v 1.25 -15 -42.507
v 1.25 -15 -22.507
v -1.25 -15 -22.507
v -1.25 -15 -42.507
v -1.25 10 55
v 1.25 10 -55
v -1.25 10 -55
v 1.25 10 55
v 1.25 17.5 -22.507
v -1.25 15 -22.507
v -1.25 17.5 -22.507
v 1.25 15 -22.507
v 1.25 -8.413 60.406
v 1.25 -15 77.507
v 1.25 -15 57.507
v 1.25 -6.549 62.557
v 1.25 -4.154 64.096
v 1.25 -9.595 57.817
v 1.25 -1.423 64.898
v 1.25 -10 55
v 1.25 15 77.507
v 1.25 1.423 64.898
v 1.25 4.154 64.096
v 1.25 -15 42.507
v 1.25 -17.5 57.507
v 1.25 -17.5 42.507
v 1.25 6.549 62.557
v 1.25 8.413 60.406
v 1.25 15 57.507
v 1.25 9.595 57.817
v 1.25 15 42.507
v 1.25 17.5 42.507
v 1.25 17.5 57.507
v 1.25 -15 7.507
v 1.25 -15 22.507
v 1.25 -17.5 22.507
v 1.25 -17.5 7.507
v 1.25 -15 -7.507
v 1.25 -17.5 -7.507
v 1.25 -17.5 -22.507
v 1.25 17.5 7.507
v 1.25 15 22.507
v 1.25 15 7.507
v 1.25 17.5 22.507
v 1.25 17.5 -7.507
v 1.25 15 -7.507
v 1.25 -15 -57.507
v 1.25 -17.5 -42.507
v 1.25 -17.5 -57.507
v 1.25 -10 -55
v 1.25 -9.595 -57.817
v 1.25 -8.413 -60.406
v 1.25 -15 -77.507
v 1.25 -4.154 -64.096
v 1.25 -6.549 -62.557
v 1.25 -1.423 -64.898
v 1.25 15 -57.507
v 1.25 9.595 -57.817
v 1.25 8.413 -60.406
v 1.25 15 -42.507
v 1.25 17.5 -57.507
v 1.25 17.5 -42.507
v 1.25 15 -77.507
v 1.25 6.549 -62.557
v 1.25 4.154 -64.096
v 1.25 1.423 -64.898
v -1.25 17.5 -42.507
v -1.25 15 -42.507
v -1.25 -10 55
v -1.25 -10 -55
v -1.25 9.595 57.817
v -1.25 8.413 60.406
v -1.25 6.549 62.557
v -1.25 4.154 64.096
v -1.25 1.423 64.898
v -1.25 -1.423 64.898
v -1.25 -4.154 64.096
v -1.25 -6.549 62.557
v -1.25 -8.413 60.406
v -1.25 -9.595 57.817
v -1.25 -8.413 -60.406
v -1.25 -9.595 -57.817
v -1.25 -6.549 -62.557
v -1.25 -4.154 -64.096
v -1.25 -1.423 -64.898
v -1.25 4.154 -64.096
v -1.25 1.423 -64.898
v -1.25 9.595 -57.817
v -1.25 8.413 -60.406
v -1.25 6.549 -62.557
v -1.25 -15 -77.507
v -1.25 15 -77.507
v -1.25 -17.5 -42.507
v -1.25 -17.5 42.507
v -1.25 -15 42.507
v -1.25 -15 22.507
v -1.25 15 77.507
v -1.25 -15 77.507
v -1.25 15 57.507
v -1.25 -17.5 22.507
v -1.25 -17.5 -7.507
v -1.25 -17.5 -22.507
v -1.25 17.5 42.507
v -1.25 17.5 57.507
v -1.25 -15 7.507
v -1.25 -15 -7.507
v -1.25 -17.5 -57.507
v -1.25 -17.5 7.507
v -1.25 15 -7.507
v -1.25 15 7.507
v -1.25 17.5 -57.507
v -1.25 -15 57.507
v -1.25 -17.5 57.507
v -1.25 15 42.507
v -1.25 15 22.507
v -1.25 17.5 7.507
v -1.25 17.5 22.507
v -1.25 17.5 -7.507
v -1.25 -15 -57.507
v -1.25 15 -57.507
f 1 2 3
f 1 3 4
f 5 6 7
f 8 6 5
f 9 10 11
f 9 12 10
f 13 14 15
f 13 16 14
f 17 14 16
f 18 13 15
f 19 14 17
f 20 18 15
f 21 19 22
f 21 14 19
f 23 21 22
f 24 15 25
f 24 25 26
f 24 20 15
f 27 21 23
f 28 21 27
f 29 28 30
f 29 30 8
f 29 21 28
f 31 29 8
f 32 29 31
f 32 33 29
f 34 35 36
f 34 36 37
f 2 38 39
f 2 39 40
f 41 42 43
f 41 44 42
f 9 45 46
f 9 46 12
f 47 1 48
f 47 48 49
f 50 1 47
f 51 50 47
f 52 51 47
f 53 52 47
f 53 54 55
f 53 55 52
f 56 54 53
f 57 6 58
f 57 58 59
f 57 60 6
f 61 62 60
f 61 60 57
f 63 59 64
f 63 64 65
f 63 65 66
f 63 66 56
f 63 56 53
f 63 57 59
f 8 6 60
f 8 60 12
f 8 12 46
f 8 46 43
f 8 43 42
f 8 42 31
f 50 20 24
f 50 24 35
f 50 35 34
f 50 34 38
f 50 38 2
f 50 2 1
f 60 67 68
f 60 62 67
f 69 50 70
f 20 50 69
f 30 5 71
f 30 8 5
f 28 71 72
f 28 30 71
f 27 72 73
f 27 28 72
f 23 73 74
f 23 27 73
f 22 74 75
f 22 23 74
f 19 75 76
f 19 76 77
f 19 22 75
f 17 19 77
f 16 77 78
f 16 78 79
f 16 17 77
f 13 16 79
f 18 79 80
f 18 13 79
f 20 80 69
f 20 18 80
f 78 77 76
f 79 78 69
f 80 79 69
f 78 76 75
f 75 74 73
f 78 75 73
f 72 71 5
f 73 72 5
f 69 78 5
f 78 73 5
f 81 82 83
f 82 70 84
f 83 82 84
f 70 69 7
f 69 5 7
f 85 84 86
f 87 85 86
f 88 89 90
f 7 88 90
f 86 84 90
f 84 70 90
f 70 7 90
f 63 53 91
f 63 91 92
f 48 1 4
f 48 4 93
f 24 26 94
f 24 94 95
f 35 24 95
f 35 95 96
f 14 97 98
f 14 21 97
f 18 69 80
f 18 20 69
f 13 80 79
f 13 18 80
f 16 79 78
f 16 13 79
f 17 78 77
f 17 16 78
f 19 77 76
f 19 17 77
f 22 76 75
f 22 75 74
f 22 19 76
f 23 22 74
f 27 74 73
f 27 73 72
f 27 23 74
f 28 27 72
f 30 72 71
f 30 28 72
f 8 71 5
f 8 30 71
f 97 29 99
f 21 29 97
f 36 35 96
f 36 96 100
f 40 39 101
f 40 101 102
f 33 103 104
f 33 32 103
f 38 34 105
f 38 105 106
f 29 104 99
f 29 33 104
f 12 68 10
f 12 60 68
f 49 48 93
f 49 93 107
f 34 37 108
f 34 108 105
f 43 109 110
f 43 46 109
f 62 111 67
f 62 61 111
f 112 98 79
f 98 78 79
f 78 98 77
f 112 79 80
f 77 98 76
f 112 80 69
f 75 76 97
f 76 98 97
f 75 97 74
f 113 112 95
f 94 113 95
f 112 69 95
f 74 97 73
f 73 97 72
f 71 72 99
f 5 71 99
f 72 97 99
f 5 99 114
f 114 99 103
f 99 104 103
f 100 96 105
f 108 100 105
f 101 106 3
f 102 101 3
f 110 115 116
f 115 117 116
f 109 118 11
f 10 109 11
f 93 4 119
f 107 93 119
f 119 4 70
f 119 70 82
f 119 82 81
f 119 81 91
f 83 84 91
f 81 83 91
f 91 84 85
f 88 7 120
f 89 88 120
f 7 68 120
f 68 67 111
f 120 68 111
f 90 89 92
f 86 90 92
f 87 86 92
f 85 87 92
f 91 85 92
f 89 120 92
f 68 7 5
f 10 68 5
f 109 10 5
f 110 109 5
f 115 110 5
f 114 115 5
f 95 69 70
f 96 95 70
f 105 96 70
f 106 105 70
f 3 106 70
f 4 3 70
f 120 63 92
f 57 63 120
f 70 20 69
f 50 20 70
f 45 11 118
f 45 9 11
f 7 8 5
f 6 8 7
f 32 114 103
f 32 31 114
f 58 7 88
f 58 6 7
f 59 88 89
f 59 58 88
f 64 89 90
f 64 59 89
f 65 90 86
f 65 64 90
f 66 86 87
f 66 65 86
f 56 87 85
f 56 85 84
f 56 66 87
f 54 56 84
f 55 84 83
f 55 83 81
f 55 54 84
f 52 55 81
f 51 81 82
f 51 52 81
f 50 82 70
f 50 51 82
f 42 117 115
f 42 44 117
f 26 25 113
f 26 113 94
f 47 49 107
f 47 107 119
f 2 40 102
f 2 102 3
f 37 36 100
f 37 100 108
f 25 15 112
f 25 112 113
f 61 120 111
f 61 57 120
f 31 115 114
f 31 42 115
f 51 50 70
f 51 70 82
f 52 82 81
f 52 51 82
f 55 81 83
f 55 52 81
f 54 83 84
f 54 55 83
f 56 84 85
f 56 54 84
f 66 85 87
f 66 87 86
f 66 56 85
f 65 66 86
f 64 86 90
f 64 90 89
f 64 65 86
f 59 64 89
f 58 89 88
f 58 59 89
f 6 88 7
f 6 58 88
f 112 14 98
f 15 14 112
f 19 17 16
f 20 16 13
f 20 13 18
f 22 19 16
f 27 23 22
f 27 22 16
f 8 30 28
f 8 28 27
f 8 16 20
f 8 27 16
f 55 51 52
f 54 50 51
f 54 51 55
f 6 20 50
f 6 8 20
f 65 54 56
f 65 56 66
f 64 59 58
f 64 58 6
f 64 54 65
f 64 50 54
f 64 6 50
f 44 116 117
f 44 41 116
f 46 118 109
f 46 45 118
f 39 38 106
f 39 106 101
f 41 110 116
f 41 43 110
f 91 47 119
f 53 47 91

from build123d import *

# Parameters (mm, degrees)
BOSS_EXTRUDE1_DEPTH = 1.25
BOSS_EXTRUDE2_DEPTH = 1.25


with BuildPart() as part:
    # Sketch1 → Boss-Extrude1 (new, symmetric)
    with BuildSketch(Plane(origin=(0, 0, 0), x_dir=(0, 0, -1), z_dir=(1, 0, 0))):
        Polygon((-77.50700933, 15), (-77.50700933, -15), (-57.50700933, -15), (-57.50700933, -17.5), (-42.50700933, -17.5), (-42.50700933, -15), (-22.50700933, -15), (-22.50700933, -17.5), (-7.50700933, -17.5), (-7.50700933, -15), (7.50700933, -15), (7.50700933, -17.5), (22.50700933, -17.5), (22.50700933, -15), (42.50700933, -15), (42.50700933, -17.5), (57.50700933, -17.5), (57.50700933, -15), (77.50700933, -15), (77.50700933, 15), (57.50700933, 15), (57.50700933, 17.5), (42.50700933, 17.5), (42.50700933, 15), (22.50700933, 15), (22.50700933, 17.5), (7.50700933, 17.5), (7.50700933, 15), (-7.50700933, 15), (-7.50700933, 17.5), (-22.50700933, 17.5), (-22.50700933, 15), (-42.50700933, 15), (-42.50700933, 17.5), (-57.50700933, 17.5), (-57.50700933, 15), align=None)
        with BuildLine():
            Line((-55, 10), (55, 10))
            ThreePointArc((55, 10), (65, 0), (55, -10))
            Line((55, -10), (-55, -10))
            ThreePointArc((-55, -10), (-65, 0), (-55, 10))
        make_face(mode=Mode.SUBTRACT)
    extrude(amount=BOSS_EXTRUDE1_DEPTH, both=True)


with BuildPart() as body_2:
    # Sketch1<2> → Boss-Extrude2 (new, symmetric)
    with BuildSketch(Plane(origin=(0, 0, 0), x_dir=(0, 0, -1), z_dir=(1, 0, 0))):
        with BuildLine():
            Line((-55, -10), (55, -10))
            ThreePointArc((55, -10), (65, 0), (55, 10))
            Line((55, 10), (-55, 10))
            ThreePointArc((-55, 10), (-65, 0), (-55, -10))
        make_face()
    extrude(amount=BOSS_EXTRUDE2_DEPTH, both=True)


solid = Compound([part.part, body_2.part])
